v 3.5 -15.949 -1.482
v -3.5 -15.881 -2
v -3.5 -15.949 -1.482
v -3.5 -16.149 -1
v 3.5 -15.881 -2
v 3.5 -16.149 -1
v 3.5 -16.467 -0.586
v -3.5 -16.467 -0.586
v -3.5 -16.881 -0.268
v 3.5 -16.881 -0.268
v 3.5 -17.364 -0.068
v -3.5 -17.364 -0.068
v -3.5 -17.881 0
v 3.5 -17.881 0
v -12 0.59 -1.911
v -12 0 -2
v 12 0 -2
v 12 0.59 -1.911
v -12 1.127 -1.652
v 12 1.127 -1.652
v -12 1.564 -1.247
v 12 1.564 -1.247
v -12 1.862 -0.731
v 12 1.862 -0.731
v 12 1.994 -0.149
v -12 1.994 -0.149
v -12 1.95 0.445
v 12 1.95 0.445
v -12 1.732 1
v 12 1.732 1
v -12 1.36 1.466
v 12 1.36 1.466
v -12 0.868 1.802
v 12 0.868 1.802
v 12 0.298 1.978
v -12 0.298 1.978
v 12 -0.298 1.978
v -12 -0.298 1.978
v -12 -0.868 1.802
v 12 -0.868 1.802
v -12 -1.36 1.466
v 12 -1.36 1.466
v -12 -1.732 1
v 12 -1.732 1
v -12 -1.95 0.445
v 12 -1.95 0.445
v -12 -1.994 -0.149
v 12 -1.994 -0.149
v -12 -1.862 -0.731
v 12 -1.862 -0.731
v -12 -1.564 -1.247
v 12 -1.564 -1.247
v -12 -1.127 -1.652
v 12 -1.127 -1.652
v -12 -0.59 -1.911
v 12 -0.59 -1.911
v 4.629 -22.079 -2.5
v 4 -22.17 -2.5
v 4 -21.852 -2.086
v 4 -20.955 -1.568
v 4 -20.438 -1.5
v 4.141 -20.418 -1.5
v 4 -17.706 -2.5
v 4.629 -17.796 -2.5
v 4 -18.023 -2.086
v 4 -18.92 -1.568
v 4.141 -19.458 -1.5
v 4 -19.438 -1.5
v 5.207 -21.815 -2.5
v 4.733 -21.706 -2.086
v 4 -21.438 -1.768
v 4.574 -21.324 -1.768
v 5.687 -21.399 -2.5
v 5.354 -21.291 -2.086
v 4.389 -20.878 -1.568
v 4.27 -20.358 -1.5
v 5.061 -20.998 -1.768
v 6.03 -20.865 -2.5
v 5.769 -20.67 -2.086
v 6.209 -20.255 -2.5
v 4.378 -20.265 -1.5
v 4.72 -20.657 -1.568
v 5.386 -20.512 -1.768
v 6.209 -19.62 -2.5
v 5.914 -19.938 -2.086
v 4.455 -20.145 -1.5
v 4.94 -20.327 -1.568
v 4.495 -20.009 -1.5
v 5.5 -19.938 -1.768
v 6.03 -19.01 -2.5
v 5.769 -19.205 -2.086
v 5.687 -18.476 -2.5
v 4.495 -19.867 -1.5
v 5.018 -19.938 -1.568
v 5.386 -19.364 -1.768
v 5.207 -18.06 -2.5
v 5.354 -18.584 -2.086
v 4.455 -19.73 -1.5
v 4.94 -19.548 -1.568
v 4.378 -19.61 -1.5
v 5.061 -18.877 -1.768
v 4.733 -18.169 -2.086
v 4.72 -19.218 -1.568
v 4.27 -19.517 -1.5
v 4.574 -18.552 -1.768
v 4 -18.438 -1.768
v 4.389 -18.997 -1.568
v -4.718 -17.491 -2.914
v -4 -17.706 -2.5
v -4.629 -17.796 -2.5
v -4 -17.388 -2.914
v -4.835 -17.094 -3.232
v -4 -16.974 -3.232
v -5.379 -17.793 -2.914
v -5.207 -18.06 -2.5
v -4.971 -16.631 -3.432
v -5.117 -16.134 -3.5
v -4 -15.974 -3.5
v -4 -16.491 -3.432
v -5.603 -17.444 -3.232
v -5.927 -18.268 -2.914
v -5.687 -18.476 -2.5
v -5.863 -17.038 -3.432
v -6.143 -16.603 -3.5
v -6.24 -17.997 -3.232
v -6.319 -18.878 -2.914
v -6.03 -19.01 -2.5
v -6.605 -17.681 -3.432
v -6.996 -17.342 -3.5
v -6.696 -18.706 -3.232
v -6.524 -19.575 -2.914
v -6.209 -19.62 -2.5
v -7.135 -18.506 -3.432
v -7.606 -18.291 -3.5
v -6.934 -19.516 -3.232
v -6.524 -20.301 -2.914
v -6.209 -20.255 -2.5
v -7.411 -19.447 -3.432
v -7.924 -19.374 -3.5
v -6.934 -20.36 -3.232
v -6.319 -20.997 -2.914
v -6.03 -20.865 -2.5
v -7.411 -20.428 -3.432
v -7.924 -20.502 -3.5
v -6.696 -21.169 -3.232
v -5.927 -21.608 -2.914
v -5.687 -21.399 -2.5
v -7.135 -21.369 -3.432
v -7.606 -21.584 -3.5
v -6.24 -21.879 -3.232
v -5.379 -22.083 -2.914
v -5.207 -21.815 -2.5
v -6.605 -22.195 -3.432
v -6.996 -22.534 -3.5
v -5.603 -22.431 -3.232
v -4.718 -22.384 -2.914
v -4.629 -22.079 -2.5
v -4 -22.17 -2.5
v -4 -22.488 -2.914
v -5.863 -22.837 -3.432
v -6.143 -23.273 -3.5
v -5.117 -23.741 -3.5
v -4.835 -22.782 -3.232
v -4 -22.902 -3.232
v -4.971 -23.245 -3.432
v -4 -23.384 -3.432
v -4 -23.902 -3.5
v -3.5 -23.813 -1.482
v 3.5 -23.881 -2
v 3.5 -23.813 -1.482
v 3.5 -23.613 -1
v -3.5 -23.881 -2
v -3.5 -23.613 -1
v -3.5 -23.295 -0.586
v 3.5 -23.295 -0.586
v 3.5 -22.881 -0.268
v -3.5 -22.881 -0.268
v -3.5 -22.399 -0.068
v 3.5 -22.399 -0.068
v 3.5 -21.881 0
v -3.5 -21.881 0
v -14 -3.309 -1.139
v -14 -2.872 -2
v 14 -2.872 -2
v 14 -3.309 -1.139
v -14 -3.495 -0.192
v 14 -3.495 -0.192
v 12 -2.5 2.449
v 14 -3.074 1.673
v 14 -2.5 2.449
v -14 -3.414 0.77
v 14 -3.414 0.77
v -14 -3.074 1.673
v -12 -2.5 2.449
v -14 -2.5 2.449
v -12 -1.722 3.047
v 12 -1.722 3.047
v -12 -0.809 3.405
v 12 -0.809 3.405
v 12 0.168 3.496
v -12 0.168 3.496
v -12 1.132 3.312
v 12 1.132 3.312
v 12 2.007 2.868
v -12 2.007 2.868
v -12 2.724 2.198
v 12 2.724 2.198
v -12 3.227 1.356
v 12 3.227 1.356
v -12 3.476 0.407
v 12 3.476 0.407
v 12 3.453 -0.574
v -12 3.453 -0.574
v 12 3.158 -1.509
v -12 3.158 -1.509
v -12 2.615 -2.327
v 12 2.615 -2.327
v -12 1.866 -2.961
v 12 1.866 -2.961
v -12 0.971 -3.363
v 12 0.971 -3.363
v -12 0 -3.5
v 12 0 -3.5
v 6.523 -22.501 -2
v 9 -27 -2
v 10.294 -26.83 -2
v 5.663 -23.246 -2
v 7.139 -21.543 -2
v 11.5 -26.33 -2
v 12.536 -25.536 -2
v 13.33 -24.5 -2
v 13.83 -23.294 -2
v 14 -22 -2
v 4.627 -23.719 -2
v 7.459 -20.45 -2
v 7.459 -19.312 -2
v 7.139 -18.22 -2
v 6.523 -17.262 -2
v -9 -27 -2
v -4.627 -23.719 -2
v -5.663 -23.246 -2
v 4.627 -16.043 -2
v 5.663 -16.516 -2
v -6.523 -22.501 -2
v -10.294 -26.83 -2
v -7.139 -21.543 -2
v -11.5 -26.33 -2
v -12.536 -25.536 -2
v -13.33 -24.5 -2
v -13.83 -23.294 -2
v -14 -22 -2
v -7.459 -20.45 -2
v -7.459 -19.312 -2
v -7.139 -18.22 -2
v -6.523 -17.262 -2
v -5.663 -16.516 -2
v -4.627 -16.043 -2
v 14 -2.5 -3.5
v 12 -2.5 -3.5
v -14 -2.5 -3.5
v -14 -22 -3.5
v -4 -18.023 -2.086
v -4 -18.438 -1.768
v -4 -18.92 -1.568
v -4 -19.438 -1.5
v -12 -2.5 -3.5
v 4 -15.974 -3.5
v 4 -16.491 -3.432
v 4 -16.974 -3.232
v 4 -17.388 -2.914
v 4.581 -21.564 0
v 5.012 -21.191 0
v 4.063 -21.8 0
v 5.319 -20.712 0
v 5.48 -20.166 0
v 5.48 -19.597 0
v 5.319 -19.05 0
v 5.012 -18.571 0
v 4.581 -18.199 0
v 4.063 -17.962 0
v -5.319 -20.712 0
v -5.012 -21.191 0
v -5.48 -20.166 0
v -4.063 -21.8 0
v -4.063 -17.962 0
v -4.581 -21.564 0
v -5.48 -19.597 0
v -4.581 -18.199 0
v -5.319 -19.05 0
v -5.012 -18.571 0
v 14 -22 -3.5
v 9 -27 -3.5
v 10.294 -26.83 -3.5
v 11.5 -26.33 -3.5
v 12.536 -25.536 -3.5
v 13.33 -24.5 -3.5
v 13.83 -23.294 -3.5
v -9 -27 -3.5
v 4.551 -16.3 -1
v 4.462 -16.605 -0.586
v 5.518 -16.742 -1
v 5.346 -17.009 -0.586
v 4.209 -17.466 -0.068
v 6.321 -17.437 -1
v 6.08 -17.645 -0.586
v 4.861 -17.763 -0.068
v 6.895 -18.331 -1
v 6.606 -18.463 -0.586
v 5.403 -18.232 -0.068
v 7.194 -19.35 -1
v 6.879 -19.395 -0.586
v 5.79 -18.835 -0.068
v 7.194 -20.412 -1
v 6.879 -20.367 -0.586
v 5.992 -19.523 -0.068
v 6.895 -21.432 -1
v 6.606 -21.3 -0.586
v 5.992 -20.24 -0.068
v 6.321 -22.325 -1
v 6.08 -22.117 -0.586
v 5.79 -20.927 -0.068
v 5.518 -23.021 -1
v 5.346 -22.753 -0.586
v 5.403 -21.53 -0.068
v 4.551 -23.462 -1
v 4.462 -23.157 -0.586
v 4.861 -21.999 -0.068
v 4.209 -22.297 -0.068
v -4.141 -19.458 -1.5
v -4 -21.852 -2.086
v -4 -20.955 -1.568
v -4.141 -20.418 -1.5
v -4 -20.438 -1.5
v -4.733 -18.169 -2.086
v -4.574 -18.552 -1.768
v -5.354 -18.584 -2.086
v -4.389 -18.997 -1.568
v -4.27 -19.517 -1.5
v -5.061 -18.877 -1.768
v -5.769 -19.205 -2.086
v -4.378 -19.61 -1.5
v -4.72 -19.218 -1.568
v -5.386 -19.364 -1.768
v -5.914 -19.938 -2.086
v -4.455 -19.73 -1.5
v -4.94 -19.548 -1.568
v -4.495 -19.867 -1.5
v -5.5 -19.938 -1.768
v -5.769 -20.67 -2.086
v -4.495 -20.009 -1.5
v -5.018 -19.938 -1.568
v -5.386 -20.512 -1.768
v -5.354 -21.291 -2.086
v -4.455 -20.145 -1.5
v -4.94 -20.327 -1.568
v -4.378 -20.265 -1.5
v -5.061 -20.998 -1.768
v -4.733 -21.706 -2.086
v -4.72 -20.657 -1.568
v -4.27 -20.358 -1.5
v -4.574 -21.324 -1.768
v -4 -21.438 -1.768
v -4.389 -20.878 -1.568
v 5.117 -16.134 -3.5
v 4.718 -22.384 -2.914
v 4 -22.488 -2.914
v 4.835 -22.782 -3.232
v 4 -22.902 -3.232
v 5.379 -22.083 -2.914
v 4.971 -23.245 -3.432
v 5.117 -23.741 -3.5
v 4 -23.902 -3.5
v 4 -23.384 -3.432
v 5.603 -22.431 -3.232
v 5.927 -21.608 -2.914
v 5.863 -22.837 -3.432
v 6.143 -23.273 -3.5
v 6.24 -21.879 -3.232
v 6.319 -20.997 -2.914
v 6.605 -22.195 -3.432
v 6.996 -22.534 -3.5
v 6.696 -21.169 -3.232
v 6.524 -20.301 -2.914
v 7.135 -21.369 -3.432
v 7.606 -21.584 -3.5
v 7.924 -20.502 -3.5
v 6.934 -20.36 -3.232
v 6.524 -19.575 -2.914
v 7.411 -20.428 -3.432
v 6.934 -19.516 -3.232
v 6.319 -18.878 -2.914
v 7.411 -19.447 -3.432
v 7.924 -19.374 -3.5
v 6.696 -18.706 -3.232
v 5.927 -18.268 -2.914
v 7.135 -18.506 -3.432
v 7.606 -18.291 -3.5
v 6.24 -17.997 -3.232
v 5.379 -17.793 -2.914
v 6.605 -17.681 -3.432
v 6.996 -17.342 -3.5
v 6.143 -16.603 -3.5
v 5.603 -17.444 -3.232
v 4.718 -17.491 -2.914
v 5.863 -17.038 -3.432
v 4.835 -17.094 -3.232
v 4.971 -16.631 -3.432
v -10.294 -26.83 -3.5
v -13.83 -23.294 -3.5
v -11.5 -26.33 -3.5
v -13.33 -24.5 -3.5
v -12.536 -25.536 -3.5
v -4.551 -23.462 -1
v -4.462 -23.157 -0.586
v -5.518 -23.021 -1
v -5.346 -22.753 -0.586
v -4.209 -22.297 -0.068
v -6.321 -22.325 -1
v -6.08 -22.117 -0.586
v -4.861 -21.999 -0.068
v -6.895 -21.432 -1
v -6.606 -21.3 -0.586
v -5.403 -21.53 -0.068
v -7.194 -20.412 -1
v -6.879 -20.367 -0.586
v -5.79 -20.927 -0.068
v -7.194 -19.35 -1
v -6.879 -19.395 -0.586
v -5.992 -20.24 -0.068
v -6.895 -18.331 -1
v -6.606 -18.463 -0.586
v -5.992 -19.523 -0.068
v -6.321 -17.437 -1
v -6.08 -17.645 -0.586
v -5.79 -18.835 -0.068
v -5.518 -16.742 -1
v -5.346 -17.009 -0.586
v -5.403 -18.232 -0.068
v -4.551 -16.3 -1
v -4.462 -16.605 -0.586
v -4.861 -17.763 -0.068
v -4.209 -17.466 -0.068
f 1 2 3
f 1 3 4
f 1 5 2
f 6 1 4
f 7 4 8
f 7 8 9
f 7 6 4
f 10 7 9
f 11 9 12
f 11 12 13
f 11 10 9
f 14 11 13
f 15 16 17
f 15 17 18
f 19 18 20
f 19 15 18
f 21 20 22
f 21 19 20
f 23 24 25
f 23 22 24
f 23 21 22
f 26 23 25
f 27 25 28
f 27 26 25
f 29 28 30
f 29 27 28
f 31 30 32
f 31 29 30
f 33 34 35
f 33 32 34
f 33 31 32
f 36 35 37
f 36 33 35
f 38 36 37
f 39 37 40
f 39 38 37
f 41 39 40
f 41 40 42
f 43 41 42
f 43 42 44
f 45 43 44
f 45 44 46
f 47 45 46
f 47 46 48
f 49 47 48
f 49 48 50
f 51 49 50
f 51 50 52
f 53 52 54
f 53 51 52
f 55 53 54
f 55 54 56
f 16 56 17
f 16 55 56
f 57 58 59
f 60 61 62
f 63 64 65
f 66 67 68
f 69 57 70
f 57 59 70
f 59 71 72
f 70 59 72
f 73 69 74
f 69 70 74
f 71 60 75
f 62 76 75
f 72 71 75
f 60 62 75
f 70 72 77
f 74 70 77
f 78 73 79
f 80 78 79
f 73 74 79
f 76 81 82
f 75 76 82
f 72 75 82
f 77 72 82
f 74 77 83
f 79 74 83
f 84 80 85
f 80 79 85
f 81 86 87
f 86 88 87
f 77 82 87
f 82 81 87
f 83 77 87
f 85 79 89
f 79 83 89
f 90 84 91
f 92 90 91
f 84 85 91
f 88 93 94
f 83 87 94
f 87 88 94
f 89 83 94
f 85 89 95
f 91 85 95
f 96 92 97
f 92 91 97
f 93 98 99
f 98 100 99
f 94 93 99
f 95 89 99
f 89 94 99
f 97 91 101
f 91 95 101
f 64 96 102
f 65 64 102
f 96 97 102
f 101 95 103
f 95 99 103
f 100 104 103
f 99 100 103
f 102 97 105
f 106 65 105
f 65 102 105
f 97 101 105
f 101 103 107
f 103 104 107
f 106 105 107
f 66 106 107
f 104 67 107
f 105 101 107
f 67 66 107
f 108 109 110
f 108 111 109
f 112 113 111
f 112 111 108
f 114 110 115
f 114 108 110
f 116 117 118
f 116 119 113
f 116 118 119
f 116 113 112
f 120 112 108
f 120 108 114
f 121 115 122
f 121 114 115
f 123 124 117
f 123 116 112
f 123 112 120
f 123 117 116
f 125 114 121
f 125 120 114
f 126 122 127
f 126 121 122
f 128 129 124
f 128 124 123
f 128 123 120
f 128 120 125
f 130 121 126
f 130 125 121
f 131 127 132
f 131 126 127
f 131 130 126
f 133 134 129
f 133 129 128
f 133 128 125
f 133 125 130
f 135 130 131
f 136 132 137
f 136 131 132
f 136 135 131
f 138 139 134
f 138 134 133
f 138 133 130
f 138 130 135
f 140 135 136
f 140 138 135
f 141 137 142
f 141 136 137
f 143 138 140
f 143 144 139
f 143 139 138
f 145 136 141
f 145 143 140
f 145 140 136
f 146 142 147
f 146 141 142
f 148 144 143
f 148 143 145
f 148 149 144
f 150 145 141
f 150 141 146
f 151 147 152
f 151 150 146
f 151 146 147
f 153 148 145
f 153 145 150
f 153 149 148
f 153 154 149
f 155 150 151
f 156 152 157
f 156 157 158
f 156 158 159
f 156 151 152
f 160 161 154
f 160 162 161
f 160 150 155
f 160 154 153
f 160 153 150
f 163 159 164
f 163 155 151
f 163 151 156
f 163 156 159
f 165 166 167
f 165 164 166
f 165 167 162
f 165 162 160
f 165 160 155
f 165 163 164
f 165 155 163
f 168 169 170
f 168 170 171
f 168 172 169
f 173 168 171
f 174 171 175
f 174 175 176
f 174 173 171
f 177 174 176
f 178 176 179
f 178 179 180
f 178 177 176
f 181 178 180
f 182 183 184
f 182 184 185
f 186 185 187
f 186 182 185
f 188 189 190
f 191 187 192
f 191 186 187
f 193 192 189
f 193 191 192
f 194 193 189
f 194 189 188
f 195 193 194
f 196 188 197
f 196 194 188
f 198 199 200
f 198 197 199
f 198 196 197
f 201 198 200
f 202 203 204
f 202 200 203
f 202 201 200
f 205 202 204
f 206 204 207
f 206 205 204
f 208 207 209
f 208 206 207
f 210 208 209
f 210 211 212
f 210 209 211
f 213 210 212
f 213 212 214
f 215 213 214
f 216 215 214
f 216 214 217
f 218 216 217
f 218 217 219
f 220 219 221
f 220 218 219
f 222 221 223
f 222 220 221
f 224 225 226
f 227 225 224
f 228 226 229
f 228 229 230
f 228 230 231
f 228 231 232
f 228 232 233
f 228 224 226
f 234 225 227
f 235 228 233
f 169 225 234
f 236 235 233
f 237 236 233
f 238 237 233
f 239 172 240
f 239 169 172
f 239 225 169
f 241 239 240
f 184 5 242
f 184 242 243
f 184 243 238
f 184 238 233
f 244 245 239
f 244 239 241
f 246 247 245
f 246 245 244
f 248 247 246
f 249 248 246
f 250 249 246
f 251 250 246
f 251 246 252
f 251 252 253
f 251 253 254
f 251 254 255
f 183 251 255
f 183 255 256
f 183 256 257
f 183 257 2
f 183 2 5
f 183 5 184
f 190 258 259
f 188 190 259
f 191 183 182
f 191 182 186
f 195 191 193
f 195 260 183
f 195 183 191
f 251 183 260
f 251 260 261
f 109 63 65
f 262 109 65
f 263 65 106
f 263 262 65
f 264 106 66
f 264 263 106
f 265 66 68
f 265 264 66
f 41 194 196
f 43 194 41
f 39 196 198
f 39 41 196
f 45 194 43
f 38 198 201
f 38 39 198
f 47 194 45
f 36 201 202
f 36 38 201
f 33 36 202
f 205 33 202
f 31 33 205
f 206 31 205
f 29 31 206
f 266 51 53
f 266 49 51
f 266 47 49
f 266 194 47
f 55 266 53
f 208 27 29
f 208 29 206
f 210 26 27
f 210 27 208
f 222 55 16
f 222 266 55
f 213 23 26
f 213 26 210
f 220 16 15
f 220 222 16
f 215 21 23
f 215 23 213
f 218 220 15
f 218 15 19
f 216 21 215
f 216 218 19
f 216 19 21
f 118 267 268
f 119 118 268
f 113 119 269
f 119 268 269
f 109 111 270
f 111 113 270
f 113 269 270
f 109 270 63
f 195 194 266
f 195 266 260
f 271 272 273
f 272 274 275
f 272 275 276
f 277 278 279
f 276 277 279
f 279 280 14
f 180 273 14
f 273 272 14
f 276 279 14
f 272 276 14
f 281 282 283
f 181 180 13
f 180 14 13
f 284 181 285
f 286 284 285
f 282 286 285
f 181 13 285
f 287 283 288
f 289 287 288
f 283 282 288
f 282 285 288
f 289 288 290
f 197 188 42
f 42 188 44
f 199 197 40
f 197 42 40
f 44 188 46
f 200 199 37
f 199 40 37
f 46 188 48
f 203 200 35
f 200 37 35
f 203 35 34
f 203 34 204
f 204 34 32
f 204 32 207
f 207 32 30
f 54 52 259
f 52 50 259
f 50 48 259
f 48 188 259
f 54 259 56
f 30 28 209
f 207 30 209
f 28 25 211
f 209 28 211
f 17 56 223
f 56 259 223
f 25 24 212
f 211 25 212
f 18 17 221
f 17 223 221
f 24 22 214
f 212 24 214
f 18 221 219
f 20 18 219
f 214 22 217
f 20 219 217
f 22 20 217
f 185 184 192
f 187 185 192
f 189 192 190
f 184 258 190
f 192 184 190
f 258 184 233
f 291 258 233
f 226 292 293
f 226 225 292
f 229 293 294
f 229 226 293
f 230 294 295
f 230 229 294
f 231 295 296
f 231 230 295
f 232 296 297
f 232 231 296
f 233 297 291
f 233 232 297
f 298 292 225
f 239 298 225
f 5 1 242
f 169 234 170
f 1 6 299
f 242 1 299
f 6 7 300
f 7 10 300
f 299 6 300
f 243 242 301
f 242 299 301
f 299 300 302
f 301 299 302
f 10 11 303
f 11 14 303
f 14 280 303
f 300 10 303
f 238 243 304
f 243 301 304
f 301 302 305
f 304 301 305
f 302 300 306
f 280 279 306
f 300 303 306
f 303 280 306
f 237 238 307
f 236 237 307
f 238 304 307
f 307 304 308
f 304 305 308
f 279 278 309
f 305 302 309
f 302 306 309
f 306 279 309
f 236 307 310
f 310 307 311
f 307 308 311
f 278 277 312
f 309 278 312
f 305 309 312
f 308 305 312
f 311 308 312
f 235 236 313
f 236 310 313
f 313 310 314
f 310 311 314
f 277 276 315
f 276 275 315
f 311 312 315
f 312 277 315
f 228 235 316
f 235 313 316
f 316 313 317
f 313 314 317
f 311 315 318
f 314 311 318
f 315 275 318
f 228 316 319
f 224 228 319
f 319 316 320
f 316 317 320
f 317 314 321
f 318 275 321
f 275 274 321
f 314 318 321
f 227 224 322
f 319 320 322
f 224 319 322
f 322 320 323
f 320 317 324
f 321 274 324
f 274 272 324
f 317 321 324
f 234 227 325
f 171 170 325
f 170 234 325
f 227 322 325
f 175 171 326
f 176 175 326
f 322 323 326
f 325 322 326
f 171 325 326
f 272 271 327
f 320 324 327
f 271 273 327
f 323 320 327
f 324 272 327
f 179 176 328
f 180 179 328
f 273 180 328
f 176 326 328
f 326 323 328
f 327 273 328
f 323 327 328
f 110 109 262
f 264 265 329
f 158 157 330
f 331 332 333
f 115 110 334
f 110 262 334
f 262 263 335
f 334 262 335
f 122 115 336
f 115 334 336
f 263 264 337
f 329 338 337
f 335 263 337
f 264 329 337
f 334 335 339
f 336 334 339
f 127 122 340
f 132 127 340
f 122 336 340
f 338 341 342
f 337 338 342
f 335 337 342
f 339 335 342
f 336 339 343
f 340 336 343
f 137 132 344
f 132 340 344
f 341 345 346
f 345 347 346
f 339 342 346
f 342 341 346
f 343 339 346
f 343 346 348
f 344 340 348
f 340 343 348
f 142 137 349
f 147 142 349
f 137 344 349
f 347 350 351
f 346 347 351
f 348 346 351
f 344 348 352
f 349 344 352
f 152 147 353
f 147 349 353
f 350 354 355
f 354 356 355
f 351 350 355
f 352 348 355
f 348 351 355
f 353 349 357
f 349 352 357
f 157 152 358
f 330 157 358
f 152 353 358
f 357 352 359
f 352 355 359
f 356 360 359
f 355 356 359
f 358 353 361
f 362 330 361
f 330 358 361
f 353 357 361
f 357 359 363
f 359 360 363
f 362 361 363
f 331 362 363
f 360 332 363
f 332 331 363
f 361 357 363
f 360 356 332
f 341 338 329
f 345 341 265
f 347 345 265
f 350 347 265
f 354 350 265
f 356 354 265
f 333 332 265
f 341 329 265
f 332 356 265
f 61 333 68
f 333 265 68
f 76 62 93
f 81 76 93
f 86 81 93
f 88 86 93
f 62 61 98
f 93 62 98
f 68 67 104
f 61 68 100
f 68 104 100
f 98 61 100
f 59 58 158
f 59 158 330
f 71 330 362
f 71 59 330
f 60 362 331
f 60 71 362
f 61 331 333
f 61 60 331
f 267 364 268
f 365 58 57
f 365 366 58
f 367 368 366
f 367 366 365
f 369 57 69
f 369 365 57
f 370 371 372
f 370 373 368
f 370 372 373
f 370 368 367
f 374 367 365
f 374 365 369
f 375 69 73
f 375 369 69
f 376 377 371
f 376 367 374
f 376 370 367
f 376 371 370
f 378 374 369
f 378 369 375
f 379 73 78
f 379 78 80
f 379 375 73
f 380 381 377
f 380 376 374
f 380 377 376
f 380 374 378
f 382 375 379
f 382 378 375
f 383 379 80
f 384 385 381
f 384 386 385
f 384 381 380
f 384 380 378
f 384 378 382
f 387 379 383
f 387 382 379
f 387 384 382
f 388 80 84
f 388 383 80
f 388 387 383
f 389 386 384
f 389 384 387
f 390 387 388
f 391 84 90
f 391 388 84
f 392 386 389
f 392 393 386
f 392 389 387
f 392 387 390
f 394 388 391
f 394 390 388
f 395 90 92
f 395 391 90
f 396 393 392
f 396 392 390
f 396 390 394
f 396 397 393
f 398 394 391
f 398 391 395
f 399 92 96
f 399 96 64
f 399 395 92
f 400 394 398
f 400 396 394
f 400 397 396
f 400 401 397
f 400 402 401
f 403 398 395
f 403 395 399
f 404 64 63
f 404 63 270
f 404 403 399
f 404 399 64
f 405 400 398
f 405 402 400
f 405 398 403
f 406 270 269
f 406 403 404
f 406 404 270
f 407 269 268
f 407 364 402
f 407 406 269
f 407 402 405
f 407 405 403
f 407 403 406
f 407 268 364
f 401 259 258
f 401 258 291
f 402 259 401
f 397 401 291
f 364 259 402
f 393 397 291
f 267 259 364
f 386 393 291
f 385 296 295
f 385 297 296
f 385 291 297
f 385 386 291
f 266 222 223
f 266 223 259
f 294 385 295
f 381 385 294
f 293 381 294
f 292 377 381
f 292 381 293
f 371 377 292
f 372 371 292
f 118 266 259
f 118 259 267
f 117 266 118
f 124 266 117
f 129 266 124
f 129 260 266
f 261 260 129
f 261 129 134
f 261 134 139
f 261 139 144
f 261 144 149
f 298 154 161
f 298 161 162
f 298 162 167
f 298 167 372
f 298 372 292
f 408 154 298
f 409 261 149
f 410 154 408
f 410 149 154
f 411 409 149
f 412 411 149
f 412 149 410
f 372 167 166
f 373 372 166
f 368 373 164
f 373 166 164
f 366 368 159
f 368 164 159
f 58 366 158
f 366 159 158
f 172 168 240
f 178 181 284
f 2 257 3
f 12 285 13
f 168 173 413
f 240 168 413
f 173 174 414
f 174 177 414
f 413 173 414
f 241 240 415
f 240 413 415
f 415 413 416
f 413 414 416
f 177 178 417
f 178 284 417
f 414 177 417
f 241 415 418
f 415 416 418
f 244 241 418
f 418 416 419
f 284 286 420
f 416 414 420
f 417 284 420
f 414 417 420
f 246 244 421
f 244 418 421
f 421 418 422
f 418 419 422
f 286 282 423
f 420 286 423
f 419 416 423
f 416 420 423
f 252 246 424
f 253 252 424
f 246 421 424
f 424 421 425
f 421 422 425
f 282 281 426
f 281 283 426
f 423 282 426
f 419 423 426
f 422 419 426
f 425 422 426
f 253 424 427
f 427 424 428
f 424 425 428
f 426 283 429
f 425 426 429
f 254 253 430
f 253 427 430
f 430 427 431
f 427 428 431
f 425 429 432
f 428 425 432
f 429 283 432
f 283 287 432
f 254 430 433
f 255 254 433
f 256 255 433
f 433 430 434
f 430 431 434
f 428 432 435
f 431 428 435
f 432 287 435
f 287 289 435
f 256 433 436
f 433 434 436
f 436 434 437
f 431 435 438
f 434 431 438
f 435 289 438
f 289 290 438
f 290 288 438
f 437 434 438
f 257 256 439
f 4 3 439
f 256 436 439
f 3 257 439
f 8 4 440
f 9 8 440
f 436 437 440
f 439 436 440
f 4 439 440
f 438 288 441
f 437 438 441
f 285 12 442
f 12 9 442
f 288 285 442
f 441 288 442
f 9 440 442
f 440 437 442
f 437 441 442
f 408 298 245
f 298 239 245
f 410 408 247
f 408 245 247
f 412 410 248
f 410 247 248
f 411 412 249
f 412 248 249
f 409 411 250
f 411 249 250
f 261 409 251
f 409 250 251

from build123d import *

# Parameters (mm, degrees)
BOSS_EXTRUDE1_DEPTH      = 14
BOSS_EXTRUDE1_DEPTH_BACK = 14
SKETCH1_R                = 2
FILLET1_R                = 5
BOSS_EXTRUDE2_DEPTH      = 2
FILLET2_R                = 2
CUT_EXTRUDE1_DEPTH       = 2
FILLET3_R                = 2
FILLET4_R                = 2
SKETCH4_W                = 2
SKETCH4_H                = 6
CUT_EXTRUDE2_DEPTH       = 32.208973069


# Some blends are built 0.0001 mm under size
with BuildPart() as part:
    # Sketch1 → Boss-Extrude1 (new, two sides: drawn at the far end of the back side and taken through both)
    with BuildSketch(Plane(origin=(0, 0, 0), x_dir=(0, 0, -1), z_dir=(1, 0, 0)).offset(-BOSS_EXTRUDE1_DEPTH_BACK)):
        with BuildLine():
            Line((3.5, 0), (3.5, -27))
            Line((3.5, -27), (2, -27))
            Line((2, -27), (2, -2.872281323))
            ThreePointArc((2, -2.872281323), (-3.102418411, 1.620185175), (3.5, 0))
        make_face()
        Circle(SKETCH1_R, mode=Mode.SUBTRACT)
    extrude(amount=BOSS_EXTRUDE1_DEPTH + BOSS_EXTRUDE1_DEPTH_BACK)

    # Fillet1
    fillet1_edges = [part.edges().sort_by_distance(p)[0] for p in [
        (-14, -27, -2.75),
        (14, -27, -2.75),
    ]]
    fillet(fillet1_edges, radius=FILLET1_R)

    # Sketch2 → Boss-Extrude2 (add)
    with BuildSketch(Plane.XY.offset(-2)):
        with BuildLine():
            Line((-3.5, -15.881230087), (3.5, -15.881230087))
            ThreePointArc((3.5, -15.881230087), (7.5, -19.881230087), (3.5, -23.881230087))
            Line((3.5, -23.881230087), (-3.5, -23.881230087))
            ThreePointArc((-3.5, -23.881230087), (-7.5, -19.881230087), (-3.5, -15.881230087))
        make_face()
    extrude(amount=BOSS_EXTRUDE2_DEPTH)

    # Fillet2
    fillet2_edges = [part.edges().sort_by_distance(p)[0] for p in [
        (-7.5, -19.881230087, 0),
        (0, -15.881230087, 0),
        (7.5, -19.881230087, 0),
        (0, -23.881230087, 0),
    ]]
    fillet(fillet2_edges, radius=FILLET2_R - 0.0001)  # a hair under: the kernel refuses the full size

    # Sketch3 → Cut-Extrude1 (cut)
    with BuildSketch(Plane(origin=(0, 0, -3.5), x_dir=(-1, 0, 0), z_dir=(0, 0, -1))):
        with BuildLine():
            Line((-4, -17.437696963), (4, -17.437696963))
            ThreePointArc((4, -17.437696963), (6.5, -19.937696963), (4, -22.437696963))
            Line((4, -22.437696963), (-4, -22.437696963))
            ThreePointArc((-4, -22.437696963), (-6.5, -19.937696963), (-4, -17.437696963))
        make_face()
    extrude(amount=-CUT_EXTRUDE1_DEPTH, mode=Mode.SUBTRACT)

    # Fillet3
    fillet3_edges = [part.edges().sort_by_distance(p)[0] for p in [
        (-6.5, -19.937696963, -1.5),
        (0, -22.437696963, -1.5),
        (6.5, -19.937696963, -1.5),
        (0, -17.437696963, -1.5),
    ]]
    fillet(fillet3_edges, radius=FILLET3_R - 0.0001)  # a hair under: the kernel refuses the full size

    # Fillet4
    # the kernel refuses this fillet: 2 mm, written as the material it takes off along each edge
    with BuildSketch(Plane(origin=(4, -19.937696963, -3.5), x_dir=(0, -1, 0), z_dir=(-1, 0, 0))) as fillet4_piece_1:
        with BuildLine():
            CenterArc((3.96414388, 2), FILLET4_R, 209.999172989, 60.000827011)
            Line((3.96414388, 0), (3.96414388, -0.2))
            Line((3.96414388, -0.2), (2.5, -0.2))
            Line((2.5, -0.2), (2.3, 0))
            ThreePointArc((2.3, 0), (2.3, 0.0001), (2.058872114, 0.900027501))
            Line((2.058872114, 0.900027501), (2.232078638, 1.000025001))
        make_face()
    revolve(axis=Axis((4, -19.937696963, -3.5), (0, 0, 1)), revolution_arc=180, mode=Mode.SUBTRACT)
    with BuildSketch(Plane(origin=(-4, -22.437696963, -3.5), x_dir=(0, 0.2587879267537998, 0.9659341638882383), z_dir=(1, 0, 0))) as fillet4_piece_2:
        with BuildLine():
            CenterArc((1.552965569, 1.931842448), FILLET4_R, 194.998154162, 60.000827011)
            Line((-0.378902759, 1.414266594), (-0.572089592, 1.362509009))
            Line((-0.572089592, 1.362509009), (-0.193186833, -0.051757585))
            Line((-0.193186833, -0.051757585), (0.051757585, -0.193186833))
            ThreePointArc((0.051757585, -0.193186833), (0.051854179, -0.193160954), (0.983525882, -0.193184245))
            Line((0.983525882, -0.193184245), (1.035293127, 0))
        make_face()
    extrude(amount=8, mode=Mode.SUBTRACT)
    with BuildSketch(Plane(origin=(-4, -19.937696963, -3.5), x_dir=(0, 1, 0), z_dir=(1, 0, 0))) as fillet4_piece_3:
        with BuildLine():
            CenterArc((3.96414388, 2), FILLET4_R, 209.999172989, 60.000827011)
            Line((2.232078638, 1.000025001), (2.058872114, 0.900027501))
            ThreePointArc((2.058872114, 0.900027501), (2.3, 0.0001), (2.3, 0))
            Line((2.3, 0), (2.5, -0.2))
            Line((2.5, -0.2), (3.96414388, -0.2))
            Line((3.96414388, -0.2), (3.96414388, 0))
        make_face()
    revolve(axis=Axis((-4, -19.937696963, -3.5), (0, 0, 1)), revolution_arc=180, mode=Mode.SUBTRACT)
    with BuildSketch(Plane(origin=(4, -17.437696963, -3.5), x_dir=(0, 1, 0), z_dir=(-1, 0, 0))) as fillet4_piece_4:
        with BuildLine():
            CenterArc((1.46414388, -2), FILLET4_R, 90, 60.000827011)
            Line((-0.267921362, -1.000025001), (-0.441127886, -0.900027501))
            ThreePointArc((-0.441127886, -0.900027501), (-0.2, -0.0001), (-0.2, 0))
            Line((-0.2, 0), (0, 0.2))
            Line((0, 0.2), (1.46414388, 0.2))
            Line((1.46414388, 0.2), (1.46414388, 0))
        make_face()
    extrude(amount=8, mode=Mode.SUBTRACT)

    # Sketch4 → Cut-Extrude2 (cut, through all)
    with BuildSketch(Plane(origin=(0, 0, -3.5), x_dir=(-1, 0, 0), z_dir=(0, 0, -1))):
        with Locations((-13, 0.5)):
            Rectangle(SKETCH4_W, SKETCH4_H)
        with Locations((13, 0.5)):
            Rectangle(SKETCH4_W, SKETCH4_H)
    extrude(amount=-CUT_EXTRUDE2_DEPTH, mode=Mode.SUBTRACT)


solid = part.part
